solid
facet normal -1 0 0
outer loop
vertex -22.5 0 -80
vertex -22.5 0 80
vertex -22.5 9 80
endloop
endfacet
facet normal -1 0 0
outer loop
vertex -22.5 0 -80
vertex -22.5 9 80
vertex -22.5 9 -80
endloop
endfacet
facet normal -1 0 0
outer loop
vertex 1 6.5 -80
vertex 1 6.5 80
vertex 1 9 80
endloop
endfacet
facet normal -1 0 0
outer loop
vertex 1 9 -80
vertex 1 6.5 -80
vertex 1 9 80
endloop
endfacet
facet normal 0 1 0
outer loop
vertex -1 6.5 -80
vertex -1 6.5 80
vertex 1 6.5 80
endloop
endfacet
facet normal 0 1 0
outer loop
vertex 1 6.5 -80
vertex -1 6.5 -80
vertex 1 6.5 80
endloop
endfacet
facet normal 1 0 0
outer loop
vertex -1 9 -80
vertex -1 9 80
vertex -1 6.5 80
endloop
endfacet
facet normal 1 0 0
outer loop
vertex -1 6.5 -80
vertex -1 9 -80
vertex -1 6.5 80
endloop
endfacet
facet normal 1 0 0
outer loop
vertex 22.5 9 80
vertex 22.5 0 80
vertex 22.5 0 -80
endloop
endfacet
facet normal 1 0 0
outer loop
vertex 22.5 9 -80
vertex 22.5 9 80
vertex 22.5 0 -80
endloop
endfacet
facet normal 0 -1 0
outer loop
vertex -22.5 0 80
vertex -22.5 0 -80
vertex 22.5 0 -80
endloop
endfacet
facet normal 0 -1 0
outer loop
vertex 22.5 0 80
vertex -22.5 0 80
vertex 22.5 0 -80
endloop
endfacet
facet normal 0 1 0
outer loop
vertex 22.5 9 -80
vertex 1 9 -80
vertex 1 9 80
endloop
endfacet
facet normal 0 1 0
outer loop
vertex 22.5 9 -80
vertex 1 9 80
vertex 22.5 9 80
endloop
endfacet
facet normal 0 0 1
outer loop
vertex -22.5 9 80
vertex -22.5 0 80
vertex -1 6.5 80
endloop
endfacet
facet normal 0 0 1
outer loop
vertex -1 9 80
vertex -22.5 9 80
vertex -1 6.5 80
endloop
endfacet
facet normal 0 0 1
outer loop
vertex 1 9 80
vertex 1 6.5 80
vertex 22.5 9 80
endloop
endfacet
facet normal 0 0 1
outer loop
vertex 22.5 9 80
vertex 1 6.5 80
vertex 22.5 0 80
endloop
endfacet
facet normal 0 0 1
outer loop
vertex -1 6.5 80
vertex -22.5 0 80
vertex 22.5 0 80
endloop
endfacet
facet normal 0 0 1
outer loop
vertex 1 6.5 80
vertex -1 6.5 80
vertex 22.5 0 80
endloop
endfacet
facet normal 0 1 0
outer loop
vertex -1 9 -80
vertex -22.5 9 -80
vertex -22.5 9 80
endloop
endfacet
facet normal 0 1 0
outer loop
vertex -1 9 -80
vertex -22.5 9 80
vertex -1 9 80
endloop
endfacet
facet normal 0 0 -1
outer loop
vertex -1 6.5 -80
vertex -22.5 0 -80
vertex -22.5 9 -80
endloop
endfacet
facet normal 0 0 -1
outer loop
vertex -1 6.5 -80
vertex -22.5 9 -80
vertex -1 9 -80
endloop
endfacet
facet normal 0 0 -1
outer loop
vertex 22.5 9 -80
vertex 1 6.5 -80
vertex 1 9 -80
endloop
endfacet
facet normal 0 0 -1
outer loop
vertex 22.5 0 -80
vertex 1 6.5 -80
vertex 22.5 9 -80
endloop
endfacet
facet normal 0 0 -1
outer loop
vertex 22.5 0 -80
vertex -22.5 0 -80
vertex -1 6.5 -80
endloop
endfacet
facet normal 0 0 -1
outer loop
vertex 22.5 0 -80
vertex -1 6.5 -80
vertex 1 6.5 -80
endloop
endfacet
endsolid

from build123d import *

# Parameters (mm, degrees)
ESQUISSE1_W                  = 45
ESQUISSE1_H                  = 160
BOSS_EXTRU_1_DEPTH           = 9
ENL_V_MAT_EXTRU_1_DEPTH      = 162.824750888
ENL_V_MAT_EXTRU_1_DEPTH_BACK = 162.824750888


with BuildPart() as part:
    # Esquisse1 → Boss.-Extru.1 (new body)
    with BuildSketch(Plane(origin=(0, 0, 0), x_dir=(1, 0, 0), z_dir=(0, 1, 0))):
        Rectangle(ESQUISSE1_W, ESQUISSE1_H)
    extrude(amount=BOSS_EXTRU_1_DEPTH)

    # Esquisse3 → Enlèv. mat.-Extru.1 (cut, two sides: drawn at the far end of the back side and taken through both)
    with BuildSketch(Plane.XY.offset(80).offset(-ENL_V_MAT_EXTRU_1_DEPTH_BACK)):
        Polygon((-1, 69.328918129), (-1, 9), (-1, 6.5), (1, 6.5), (1, 9), (1, 69.328918129), (1, 189.986754386), (-1, 189.986754386), align=None)
    extrude(amount=ENL_V_MAT_EXTRU_1_DEPTH + ENL_V_MAT_EXTRU_1_DEPTH_BACK, mode=Mode.SUBTRACT)


solid = part.part
